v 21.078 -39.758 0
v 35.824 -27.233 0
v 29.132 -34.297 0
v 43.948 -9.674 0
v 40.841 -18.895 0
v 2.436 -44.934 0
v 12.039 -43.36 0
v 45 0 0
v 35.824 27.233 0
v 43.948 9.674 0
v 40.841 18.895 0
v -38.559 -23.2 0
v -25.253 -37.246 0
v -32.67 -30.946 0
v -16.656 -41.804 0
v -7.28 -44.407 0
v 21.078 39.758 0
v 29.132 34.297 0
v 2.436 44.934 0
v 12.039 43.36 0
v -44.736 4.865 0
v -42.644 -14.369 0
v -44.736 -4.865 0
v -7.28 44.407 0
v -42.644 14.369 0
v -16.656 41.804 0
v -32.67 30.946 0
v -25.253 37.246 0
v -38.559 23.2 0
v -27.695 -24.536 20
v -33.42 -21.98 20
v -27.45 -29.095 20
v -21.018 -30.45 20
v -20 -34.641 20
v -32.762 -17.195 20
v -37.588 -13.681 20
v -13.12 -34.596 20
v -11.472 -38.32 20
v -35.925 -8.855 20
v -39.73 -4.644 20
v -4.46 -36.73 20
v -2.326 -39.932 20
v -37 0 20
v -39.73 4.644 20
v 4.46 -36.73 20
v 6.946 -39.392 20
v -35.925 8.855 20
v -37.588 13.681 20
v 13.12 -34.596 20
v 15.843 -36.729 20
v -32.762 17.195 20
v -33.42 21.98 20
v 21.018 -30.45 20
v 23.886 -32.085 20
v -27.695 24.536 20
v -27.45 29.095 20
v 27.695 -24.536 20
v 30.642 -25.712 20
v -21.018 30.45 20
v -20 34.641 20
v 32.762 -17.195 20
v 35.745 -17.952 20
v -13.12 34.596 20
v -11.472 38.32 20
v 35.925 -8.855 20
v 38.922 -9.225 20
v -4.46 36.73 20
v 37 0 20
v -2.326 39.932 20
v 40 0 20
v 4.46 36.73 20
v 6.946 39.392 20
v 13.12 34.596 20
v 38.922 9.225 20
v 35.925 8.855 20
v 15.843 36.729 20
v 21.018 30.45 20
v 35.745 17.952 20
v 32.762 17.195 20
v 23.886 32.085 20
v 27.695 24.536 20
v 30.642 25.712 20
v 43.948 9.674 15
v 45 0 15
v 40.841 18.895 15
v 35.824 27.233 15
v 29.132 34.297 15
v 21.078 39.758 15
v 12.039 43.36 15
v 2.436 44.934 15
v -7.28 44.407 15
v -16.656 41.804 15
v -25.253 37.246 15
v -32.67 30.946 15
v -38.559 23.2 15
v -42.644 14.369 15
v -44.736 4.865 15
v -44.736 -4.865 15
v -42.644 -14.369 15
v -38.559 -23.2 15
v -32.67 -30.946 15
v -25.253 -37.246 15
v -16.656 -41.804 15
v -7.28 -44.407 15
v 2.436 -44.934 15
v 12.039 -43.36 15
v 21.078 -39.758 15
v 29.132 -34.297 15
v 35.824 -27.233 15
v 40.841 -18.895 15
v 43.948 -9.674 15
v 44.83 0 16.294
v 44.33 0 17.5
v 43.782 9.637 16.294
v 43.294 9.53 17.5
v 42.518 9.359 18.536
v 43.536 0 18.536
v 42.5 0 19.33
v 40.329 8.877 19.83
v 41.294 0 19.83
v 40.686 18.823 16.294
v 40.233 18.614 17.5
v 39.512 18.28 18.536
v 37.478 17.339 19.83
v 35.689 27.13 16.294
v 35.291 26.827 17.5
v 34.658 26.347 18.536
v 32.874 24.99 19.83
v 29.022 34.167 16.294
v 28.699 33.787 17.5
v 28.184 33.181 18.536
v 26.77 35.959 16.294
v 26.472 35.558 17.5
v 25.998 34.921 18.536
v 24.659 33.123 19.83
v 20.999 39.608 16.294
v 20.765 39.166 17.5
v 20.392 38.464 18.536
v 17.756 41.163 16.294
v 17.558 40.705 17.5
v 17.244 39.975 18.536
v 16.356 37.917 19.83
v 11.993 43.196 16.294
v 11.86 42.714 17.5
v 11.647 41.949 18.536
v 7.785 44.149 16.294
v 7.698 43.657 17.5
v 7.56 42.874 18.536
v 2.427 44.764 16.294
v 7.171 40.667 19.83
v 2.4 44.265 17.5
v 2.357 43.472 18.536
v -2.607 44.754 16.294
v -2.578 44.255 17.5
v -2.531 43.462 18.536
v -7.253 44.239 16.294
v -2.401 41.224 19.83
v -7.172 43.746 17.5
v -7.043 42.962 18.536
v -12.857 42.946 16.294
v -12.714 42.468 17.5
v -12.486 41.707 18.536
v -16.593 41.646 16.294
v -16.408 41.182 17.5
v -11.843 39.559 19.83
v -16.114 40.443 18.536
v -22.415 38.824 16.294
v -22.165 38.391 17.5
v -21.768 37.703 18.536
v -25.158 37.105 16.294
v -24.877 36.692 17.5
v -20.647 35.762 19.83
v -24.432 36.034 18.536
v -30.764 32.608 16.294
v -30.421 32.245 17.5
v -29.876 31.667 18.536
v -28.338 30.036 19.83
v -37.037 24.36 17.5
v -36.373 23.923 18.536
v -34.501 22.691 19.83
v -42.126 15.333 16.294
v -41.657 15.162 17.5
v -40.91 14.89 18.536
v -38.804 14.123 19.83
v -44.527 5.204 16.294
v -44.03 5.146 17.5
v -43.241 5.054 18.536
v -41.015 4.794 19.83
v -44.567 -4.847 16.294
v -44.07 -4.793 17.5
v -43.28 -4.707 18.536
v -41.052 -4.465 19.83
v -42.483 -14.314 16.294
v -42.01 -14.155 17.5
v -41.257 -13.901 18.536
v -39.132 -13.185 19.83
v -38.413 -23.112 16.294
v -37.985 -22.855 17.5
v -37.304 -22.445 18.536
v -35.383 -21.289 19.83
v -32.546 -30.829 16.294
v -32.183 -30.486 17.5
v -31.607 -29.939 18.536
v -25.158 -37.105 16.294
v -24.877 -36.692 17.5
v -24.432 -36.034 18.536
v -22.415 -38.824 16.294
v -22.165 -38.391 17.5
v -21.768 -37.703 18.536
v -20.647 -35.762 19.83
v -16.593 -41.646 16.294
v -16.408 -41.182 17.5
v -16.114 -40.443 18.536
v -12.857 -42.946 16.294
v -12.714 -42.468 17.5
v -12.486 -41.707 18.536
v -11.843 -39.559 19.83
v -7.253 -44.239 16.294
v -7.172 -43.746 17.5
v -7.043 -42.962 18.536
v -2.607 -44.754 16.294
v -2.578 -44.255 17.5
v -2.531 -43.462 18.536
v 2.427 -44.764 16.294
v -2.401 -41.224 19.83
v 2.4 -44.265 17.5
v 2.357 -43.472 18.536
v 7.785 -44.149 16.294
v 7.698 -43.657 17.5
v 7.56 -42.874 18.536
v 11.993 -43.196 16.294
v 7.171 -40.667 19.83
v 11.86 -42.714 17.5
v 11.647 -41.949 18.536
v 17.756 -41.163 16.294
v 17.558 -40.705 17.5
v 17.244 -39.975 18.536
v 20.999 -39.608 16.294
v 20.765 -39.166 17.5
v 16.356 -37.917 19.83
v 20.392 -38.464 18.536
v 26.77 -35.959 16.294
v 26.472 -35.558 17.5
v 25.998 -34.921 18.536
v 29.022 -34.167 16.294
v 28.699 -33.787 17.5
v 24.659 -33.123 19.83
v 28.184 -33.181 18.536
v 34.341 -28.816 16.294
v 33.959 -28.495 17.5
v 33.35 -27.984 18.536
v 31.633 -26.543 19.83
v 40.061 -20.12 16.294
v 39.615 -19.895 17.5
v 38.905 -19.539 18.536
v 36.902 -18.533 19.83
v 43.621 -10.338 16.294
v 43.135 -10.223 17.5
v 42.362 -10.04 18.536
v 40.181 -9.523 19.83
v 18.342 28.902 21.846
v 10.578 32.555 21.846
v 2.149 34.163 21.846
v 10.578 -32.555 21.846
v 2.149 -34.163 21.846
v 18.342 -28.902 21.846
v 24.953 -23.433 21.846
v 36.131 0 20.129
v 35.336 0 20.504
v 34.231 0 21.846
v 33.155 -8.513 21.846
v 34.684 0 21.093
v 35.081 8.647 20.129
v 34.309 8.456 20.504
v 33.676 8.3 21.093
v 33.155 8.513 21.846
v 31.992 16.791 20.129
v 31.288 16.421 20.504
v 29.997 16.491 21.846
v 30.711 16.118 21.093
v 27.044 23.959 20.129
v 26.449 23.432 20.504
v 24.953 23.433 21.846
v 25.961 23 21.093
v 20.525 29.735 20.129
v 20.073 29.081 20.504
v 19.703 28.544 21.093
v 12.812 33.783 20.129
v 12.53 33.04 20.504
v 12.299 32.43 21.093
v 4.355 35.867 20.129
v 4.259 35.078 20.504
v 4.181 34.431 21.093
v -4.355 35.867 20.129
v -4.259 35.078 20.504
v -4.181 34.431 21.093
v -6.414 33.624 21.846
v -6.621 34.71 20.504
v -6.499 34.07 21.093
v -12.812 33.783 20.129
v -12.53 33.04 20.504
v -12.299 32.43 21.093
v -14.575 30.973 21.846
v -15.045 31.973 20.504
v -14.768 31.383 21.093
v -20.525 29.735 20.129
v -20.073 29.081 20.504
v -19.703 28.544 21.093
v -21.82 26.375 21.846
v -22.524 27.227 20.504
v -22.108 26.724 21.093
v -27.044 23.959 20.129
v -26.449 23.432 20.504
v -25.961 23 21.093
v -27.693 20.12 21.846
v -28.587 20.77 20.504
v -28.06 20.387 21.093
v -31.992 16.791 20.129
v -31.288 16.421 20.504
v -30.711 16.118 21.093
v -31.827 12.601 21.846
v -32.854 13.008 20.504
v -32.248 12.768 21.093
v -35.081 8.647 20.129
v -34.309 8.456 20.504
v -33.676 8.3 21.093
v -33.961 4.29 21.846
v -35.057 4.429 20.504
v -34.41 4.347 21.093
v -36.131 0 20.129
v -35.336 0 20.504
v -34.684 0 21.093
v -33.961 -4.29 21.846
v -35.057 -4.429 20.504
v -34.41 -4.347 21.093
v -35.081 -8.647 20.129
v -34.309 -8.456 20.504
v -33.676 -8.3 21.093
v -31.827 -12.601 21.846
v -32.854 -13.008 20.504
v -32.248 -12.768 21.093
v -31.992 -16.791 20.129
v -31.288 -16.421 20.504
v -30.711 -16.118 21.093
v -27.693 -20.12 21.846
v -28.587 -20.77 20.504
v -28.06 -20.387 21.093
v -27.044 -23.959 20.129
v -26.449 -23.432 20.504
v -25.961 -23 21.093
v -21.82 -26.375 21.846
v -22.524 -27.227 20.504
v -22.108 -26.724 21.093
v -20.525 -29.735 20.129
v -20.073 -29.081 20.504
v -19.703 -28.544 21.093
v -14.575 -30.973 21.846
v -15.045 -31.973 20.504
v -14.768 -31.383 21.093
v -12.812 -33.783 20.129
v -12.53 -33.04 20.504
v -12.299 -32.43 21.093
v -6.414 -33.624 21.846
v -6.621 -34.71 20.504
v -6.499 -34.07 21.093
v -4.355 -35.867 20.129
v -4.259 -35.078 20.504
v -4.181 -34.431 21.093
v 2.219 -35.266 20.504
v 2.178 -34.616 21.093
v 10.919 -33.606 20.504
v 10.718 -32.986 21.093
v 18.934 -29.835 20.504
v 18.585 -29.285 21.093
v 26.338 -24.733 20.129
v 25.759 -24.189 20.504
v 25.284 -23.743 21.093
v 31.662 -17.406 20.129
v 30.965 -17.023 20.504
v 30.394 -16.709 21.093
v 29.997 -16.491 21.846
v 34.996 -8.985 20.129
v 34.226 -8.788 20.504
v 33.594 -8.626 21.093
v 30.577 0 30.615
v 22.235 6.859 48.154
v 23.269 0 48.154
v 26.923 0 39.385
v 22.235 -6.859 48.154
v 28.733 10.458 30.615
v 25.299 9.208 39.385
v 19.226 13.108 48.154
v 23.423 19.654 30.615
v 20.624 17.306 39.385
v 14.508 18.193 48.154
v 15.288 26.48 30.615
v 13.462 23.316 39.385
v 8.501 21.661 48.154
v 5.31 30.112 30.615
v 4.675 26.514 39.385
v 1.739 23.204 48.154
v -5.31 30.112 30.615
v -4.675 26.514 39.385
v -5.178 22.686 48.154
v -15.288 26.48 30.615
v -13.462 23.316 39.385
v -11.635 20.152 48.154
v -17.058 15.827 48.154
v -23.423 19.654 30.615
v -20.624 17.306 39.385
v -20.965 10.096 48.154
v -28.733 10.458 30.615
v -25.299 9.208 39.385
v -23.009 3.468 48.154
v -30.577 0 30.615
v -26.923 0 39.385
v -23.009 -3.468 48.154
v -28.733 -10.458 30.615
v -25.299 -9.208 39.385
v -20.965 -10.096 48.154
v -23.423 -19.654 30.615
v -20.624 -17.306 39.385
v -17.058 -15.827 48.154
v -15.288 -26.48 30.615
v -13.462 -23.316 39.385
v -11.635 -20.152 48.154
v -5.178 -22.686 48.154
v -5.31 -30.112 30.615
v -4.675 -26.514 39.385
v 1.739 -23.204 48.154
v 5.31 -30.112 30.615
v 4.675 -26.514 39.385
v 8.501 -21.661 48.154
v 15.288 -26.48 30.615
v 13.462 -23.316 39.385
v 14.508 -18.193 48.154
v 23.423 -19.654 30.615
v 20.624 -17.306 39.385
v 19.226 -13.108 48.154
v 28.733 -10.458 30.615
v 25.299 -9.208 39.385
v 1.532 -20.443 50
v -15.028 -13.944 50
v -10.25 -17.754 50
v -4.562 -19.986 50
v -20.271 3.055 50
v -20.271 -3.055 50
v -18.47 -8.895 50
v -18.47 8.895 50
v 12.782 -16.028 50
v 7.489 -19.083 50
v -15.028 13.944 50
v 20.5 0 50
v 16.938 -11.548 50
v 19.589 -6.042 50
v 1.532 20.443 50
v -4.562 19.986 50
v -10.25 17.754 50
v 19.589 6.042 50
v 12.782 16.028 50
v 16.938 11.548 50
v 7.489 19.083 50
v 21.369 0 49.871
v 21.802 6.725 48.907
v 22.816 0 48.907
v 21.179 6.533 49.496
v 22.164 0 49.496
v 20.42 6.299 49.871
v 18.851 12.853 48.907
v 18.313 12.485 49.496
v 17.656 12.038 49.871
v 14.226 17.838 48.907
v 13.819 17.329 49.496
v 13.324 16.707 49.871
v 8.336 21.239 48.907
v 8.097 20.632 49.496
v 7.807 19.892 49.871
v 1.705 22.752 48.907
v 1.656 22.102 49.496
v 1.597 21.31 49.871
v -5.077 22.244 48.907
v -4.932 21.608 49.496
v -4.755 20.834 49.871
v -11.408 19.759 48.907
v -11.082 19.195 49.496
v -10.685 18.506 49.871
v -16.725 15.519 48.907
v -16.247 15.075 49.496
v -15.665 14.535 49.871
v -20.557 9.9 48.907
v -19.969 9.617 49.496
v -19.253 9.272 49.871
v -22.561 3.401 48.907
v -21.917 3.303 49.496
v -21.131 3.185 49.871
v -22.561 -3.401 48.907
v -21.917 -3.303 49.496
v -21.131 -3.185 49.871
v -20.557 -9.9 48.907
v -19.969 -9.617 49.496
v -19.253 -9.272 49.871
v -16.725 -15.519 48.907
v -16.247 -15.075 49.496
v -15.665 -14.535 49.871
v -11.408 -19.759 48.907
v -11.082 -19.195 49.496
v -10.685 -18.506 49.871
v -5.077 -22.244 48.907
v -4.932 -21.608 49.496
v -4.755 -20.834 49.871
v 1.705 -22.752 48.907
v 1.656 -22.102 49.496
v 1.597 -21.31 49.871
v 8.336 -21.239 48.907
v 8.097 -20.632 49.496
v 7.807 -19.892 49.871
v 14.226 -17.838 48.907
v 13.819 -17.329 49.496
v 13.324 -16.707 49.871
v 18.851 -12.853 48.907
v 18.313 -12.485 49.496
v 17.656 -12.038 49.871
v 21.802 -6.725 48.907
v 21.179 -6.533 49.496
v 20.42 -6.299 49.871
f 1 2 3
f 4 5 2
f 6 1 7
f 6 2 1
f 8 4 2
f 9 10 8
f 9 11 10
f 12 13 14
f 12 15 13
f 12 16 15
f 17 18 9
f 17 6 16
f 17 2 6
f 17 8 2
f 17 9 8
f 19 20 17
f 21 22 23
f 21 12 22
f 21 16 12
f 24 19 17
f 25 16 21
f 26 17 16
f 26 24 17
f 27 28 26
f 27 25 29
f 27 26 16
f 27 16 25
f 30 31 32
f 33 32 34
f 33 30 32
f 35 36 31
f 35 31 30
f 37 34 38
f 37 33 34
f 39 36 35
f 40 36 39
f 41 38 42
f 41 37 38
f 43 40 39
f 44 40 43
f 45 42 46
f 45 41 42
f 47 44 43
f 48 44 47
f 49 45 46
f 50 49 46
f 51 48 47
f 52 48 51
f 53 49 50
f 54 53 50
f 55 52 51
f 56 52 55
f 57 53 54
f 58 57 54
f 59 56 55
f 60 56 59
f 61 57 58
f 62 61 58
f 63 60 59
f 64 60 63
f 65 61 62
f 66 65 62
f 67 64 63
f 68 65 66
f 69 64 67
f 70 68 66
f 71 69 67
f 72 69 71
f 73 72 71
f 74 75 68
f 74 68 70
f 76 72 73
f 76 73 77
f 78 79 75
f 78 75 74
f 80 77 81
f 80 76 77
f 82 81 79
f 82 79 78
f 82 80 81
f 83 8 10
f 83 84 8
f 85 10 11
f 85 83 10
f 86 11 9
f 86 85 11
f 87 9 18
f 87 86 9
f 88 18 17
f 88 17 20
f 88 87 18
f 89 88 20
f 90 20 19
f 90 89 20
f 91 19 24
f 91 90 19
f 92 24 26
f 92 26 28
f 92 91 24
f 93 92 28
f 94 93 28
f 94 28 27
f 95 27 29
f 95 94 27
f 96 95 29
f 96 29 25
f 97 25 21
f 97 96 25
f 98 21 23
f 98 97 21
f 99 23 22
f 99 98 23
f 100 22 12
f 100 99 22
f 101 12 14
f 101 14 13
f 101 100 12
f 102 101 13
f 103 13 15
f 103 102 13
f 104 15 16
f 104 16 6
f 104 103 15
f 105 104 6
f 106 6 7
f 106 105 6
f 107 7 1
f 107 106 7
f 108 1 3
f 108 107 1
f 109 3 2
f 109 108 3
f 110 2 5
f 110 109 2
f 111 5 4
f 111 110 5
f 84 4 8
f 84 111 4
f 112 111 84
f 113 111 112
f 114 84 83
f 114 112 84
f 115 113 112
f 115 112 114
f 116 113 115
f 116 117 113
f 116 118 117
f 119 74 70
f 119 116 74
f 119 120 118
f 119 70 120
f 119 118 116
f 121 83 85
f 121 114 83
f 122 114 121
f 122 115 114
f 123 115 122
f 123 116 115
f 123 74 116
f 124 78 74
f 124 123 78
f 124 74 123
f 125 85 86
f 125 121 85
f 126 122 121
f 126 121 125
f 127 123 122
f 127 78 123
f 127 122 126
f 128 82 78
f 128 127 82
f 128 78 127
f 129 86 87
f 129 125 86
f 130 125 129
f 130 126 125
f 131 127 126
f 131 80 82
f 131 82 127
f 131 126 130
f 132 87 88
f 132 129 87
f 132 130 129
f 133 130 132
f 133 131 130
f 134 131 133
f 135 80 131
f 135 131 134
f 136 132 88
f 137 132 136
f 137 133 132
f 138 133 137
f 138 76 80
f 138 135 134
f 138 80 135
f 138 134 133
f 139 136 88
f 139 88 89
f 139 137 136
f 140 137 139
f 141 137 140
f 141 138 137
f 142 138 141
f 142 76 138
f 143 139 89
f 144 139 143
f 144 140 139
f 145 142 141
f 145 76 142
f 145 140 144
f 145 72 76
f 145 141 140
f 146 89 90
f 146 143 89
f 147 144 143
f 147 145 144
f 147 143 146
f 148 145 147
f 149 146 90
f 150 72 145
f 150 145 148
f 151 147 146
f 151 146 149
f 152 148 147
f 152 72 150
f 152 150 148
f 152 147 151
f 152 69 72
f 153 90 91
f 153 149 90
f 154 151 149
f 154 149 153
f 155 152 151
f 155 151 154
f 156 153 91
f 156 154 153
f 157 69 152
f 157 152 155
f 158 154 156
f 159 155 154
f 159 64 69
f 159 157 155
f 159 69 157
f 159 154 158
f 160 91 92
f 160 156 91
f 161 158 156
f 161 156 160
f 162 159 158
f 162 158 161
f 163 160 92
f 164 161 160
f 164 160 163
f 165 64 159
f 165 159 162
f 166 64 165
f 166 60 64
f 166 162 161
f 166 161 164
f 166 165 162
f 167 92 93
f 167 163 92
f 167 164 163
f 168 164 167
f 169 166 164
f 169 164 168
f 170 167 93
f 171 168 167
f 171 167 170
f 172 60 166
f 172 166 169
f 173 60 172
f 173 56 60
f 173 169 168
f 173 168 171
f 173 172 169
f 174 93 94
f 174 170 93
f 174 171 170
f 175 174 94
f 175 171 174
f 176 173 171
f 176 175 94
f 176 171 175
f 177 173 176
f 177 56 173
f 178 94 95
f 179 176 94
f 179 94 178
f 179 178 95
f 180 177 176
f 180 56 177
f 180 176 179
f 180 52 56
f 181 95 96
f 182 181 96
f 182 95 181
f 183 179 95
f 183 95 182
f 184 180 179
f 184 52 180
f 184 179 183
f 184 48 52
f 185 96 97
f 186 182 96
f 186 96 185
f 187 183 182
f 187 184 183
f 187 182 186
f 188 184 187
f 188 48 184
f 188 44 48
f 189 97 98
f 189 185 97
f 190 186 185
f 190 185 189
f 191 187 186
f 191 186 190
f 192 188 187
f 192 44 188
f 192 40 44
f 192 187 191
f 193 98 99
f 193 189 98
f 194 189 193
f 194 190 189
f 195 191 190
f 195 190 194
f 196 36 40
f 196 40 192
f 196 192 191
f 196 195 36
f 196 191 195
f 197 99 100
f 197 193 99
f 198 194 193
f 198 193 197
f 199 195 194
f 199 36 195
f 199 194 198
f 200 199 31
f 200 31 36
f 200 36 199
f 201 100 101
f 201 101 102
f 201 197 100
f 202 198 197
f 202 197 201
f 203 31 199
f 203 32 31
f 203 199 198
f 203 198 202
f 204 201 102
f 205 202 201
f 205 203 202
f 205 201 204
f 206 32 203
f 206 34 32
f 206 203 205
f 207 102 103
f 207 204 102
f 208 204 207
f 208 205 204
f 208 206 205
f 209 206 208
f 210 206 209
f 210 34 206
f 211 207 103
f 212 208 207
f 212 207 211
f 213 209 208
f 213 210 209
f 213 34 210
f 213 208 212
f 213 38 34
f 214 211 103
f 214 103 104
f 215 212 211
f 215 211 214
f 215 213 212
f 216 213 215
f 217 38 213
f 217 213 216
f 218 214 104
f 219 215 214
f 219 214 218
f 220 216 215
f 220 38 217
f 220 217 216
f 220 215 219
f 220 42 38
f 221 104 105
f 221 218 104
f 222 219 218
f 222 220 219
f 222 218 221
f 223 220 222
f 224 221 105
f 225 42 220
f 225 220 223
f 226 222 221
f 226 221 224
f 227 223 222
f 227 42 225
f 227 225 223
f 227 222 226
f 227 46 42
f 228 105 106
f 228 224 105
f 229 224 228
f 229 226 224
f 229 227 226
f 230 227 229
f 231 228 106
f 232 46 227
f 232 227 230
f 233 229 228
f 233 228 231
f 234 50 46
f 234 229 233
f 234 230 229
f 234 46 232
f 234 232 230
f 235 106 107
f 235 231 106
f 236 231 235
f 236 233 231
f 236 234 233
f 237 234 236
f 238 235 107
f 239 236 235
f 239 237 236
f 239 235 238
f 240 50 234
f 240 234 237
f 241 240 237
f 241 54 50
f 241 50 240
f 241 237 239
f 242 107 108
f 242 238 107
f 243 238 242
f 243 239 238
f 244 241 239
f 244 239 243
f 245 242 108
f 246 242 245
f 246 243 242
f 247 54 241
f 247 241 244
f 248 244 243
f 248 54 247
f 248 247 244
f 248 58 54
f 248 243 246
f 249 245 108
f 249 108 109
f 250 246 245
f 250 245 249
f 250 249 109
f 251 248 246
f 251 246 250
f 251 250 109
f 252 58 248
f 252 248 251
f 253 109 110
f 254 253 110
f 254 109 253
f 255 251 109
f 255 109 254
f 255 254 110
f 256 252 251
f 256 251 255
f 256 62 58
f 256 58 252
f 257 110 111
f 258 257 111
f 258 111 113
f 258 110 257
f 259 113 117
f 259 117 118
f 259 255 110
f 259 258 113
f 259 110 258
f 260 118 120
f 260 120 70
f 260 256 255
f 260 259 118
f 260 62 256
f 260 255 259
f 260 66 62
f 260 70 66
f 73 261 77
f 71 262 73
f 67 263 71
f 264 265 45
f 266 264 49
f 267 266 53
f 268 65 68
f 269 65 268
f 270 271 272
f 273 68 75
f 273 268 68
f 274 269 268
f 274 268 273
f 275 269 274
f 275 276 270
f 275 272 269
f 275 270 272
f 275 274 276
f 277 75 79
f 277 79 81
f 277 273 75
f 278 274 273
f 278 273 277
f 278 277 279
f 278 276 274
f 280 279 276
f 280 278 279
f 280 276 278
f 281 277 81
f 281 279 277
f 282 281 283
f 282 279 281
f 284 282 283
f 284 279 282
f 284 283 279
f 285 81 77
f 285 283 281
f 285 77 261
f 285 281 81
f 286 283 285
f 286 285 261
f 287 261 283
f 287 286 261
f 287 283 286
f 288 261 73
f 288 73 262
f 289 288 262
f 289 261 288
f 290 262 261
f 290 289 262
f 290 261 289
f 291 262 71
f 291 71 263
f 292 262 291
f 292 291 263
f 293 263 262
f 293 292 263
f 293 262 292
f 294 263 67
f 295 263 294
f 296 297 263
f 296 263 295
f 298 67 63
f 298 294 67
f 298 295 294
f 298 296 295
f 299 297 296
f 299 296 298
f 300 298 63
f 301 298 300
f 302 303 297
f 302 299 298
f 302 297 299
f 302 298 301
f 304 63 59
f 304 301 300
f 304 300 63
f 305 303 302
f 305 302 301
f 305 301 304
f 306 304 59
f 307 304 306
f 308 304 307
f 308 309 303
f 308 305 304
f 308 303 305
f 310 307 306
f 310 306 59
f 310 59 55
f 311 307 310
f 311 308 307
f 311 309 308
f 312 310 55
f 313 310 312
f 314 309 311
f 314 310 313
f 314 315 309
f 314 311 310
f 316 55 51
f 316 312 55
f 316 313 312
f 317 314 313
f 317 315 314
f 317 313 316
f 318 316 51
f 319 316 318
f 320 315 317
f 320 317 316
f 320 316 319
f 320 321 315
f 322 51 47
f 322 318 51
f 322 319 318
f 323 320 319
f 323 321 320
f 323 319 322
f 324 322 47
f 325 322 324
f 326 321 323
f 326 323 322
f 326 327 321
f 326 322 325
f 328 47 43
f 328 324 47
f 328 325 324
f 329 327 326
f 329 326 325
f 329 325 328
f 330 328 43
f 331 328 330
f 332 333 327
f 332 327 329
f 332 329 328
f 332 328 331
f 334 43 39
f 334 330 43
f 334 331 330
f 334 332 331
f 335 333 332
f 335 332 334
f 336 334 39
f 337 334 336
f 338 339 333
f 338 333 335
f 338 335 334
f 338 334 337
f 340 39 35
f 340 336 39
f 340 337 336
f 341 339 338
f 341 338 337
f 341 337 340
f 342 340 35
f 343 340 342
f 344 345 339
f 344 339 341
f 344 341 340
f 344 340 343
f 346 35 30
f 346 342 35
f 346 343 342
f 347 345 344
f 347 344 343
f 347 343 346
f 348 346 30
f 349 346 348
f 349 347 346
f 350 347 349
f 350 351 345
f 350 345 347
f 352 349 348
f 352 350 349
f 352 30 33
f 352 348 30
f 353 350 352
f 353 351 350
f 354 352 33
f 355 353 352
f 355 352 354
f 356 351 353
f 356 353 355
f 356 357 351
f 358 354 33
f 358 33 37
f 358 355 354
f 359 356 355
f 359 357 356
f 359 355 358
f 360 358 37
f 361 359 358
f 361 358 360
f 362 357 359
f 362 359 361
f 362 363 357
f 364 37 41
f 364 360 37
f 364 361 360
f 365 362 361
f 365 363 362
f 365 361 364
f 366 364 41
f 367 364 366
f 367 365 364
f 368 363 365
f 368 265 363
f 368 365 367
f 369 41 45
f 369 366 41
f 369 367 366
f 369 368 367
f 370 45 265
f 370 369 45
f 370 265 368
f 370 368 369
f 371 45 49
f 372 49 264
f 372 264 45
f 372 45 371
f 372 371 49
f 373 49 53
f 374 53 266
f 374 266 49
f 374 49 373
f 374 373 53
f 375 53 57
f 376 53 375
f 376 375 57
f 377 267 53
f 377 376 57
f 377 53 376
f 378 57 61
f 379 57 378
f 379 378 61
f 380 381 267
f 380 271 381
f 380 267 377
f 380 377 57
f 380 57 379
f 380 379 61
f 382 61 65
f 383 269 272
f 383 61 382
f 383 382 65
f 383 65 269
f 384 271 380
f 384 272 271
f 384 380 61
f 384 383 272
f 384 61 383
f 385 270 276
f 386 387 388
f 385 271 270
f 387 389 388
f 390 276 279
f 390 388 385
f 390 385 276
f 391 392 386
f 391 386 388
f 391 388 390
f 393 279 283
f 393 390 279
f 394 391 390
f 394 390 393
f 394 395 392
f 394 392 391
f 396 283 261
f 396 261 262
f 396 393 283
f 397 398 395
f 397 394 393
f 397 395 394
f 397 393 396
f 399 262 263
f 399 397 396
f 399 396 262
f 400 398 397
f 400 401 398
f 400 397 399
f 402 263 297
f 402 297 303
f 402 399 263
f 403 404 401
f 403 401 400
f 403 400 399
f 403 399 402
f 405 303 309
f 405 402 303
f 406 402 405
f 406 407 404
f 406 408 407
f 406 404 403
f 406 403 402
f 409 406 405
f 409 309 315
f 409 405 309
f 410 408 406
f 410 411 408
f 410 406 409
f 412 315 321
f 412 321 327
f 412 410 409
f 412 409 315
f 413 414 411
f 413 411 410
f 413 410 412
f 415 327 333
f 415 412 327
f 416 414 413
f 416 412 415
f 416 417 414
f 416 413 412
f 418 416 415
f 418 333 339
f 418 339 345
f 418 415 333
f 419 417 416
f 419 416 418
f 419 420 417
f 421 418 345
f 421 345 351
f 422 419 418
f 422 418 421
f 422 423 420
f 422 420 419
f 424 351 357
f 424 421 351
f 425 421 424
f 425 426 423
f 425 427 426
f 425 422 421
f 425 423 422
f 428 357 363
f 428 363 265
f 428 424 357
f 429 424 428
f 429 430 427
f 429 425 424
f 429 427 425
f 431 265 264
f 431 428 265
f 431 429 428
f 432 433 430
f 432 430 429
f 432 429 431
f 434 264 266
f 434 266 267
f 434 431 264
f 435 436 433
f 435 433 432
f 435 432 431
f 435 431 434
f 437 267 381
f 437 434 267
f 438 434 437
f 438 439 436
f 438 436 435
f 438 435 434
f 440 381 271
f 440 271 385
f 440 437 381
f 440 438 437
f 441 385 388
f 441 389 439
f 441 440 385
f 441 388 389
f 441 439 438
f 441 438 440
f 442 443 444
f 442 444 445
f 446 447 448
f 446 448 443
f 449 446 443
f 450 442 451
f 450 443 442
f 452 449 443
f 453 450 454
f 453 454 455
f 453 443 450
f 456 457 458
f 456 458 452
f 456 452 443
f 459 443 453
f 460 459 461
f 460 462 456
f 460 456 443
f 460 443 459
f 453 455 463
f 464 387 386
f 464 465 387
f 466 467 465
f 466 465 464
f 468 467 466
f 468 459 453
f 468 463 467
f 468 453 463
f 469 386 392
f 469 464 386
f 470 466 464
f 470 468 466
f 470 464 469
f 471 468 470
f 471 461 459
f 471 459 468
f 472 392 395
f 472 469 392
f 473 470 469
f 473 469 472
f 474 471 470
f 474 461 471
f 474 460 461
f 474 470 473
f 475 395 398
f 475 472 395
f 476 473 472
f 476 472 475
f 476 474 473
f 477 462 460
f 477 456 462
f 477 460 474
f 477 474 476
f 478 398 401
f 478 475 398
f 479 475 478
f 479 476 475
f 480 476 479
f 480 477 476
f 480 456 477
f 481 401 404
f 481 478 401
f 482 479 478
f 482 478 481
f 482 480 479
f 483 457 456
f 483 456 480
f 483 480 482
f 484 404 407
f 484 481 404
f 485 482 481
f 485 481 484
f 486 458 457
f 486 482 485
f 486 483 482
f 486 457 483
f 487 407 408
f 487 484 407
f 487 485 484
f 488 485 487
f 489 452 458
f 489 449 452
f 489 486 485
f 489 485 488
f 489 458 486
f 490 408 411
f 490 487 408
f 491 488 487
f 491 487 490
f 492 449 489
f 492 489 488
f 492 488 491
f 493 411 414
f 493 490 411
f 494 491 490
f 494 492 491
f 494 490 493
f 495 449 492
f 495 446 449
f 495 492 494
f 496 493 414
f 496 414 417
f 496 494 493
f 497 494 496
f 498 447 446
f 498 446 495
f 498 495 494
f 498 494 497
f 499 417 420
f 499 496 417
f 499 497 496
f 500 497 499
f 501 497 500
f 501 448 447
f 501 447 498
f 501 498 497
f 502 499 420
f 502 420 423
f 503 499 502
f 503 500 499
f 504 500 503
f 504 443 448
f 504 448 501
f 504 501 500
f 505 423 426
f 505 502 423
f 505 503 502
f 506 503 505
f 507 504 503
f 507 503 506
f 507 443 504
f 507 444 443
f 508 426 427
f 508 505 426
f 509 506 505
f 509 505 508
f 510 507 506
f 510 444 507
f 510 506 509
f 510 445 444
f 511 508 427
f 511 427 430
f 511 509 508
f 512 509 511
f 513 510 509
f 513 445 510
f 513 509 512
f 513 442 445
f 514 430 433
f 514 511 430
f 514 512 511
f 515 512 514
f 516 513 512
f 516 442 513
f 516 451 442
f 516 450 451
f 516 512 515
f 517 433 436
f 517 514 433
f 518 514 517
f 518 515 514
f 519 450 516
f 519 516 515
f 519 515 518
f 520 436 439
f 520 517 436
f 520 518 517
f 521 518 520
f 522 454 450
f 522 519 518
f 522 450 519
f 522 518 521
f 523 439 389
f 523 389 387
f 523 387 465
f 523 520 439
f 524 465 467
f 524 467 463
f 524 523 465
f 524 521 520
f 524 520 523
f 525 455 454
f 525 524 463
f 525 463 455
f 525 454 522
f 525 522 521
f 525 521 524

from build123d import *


with BuildPart() as f1:
    # F0 (on Front) → F1 (revolve)
    with BuildSketch(Plane.XZ):
        with BuildLine():
            Line((20.5, 50), (0, 50))
            Line((0, 50), (0, 0))
            Line((0, 0), (45, 0))
            Line((45, 0), (45, 15))
            ThreePointArc((45, 15), (43.535534, 18.535534), (40, 20))
            Line((40, 20), (37, 20))
            ThreePointArc((37, 20), (35.335899, 20.503849), (34.230769, 21.846154))
            Line((34.230769, 21.846154), (23.269231, 48.153846))
            ThreePointArc((23.269231, 48.153846), (22.164101, 49.496151), (20.5, 50))
        make_face()
    revolve(axis=Axis((0, 0, 23.88157), (0, 0, 1)))


solid = f1.part
